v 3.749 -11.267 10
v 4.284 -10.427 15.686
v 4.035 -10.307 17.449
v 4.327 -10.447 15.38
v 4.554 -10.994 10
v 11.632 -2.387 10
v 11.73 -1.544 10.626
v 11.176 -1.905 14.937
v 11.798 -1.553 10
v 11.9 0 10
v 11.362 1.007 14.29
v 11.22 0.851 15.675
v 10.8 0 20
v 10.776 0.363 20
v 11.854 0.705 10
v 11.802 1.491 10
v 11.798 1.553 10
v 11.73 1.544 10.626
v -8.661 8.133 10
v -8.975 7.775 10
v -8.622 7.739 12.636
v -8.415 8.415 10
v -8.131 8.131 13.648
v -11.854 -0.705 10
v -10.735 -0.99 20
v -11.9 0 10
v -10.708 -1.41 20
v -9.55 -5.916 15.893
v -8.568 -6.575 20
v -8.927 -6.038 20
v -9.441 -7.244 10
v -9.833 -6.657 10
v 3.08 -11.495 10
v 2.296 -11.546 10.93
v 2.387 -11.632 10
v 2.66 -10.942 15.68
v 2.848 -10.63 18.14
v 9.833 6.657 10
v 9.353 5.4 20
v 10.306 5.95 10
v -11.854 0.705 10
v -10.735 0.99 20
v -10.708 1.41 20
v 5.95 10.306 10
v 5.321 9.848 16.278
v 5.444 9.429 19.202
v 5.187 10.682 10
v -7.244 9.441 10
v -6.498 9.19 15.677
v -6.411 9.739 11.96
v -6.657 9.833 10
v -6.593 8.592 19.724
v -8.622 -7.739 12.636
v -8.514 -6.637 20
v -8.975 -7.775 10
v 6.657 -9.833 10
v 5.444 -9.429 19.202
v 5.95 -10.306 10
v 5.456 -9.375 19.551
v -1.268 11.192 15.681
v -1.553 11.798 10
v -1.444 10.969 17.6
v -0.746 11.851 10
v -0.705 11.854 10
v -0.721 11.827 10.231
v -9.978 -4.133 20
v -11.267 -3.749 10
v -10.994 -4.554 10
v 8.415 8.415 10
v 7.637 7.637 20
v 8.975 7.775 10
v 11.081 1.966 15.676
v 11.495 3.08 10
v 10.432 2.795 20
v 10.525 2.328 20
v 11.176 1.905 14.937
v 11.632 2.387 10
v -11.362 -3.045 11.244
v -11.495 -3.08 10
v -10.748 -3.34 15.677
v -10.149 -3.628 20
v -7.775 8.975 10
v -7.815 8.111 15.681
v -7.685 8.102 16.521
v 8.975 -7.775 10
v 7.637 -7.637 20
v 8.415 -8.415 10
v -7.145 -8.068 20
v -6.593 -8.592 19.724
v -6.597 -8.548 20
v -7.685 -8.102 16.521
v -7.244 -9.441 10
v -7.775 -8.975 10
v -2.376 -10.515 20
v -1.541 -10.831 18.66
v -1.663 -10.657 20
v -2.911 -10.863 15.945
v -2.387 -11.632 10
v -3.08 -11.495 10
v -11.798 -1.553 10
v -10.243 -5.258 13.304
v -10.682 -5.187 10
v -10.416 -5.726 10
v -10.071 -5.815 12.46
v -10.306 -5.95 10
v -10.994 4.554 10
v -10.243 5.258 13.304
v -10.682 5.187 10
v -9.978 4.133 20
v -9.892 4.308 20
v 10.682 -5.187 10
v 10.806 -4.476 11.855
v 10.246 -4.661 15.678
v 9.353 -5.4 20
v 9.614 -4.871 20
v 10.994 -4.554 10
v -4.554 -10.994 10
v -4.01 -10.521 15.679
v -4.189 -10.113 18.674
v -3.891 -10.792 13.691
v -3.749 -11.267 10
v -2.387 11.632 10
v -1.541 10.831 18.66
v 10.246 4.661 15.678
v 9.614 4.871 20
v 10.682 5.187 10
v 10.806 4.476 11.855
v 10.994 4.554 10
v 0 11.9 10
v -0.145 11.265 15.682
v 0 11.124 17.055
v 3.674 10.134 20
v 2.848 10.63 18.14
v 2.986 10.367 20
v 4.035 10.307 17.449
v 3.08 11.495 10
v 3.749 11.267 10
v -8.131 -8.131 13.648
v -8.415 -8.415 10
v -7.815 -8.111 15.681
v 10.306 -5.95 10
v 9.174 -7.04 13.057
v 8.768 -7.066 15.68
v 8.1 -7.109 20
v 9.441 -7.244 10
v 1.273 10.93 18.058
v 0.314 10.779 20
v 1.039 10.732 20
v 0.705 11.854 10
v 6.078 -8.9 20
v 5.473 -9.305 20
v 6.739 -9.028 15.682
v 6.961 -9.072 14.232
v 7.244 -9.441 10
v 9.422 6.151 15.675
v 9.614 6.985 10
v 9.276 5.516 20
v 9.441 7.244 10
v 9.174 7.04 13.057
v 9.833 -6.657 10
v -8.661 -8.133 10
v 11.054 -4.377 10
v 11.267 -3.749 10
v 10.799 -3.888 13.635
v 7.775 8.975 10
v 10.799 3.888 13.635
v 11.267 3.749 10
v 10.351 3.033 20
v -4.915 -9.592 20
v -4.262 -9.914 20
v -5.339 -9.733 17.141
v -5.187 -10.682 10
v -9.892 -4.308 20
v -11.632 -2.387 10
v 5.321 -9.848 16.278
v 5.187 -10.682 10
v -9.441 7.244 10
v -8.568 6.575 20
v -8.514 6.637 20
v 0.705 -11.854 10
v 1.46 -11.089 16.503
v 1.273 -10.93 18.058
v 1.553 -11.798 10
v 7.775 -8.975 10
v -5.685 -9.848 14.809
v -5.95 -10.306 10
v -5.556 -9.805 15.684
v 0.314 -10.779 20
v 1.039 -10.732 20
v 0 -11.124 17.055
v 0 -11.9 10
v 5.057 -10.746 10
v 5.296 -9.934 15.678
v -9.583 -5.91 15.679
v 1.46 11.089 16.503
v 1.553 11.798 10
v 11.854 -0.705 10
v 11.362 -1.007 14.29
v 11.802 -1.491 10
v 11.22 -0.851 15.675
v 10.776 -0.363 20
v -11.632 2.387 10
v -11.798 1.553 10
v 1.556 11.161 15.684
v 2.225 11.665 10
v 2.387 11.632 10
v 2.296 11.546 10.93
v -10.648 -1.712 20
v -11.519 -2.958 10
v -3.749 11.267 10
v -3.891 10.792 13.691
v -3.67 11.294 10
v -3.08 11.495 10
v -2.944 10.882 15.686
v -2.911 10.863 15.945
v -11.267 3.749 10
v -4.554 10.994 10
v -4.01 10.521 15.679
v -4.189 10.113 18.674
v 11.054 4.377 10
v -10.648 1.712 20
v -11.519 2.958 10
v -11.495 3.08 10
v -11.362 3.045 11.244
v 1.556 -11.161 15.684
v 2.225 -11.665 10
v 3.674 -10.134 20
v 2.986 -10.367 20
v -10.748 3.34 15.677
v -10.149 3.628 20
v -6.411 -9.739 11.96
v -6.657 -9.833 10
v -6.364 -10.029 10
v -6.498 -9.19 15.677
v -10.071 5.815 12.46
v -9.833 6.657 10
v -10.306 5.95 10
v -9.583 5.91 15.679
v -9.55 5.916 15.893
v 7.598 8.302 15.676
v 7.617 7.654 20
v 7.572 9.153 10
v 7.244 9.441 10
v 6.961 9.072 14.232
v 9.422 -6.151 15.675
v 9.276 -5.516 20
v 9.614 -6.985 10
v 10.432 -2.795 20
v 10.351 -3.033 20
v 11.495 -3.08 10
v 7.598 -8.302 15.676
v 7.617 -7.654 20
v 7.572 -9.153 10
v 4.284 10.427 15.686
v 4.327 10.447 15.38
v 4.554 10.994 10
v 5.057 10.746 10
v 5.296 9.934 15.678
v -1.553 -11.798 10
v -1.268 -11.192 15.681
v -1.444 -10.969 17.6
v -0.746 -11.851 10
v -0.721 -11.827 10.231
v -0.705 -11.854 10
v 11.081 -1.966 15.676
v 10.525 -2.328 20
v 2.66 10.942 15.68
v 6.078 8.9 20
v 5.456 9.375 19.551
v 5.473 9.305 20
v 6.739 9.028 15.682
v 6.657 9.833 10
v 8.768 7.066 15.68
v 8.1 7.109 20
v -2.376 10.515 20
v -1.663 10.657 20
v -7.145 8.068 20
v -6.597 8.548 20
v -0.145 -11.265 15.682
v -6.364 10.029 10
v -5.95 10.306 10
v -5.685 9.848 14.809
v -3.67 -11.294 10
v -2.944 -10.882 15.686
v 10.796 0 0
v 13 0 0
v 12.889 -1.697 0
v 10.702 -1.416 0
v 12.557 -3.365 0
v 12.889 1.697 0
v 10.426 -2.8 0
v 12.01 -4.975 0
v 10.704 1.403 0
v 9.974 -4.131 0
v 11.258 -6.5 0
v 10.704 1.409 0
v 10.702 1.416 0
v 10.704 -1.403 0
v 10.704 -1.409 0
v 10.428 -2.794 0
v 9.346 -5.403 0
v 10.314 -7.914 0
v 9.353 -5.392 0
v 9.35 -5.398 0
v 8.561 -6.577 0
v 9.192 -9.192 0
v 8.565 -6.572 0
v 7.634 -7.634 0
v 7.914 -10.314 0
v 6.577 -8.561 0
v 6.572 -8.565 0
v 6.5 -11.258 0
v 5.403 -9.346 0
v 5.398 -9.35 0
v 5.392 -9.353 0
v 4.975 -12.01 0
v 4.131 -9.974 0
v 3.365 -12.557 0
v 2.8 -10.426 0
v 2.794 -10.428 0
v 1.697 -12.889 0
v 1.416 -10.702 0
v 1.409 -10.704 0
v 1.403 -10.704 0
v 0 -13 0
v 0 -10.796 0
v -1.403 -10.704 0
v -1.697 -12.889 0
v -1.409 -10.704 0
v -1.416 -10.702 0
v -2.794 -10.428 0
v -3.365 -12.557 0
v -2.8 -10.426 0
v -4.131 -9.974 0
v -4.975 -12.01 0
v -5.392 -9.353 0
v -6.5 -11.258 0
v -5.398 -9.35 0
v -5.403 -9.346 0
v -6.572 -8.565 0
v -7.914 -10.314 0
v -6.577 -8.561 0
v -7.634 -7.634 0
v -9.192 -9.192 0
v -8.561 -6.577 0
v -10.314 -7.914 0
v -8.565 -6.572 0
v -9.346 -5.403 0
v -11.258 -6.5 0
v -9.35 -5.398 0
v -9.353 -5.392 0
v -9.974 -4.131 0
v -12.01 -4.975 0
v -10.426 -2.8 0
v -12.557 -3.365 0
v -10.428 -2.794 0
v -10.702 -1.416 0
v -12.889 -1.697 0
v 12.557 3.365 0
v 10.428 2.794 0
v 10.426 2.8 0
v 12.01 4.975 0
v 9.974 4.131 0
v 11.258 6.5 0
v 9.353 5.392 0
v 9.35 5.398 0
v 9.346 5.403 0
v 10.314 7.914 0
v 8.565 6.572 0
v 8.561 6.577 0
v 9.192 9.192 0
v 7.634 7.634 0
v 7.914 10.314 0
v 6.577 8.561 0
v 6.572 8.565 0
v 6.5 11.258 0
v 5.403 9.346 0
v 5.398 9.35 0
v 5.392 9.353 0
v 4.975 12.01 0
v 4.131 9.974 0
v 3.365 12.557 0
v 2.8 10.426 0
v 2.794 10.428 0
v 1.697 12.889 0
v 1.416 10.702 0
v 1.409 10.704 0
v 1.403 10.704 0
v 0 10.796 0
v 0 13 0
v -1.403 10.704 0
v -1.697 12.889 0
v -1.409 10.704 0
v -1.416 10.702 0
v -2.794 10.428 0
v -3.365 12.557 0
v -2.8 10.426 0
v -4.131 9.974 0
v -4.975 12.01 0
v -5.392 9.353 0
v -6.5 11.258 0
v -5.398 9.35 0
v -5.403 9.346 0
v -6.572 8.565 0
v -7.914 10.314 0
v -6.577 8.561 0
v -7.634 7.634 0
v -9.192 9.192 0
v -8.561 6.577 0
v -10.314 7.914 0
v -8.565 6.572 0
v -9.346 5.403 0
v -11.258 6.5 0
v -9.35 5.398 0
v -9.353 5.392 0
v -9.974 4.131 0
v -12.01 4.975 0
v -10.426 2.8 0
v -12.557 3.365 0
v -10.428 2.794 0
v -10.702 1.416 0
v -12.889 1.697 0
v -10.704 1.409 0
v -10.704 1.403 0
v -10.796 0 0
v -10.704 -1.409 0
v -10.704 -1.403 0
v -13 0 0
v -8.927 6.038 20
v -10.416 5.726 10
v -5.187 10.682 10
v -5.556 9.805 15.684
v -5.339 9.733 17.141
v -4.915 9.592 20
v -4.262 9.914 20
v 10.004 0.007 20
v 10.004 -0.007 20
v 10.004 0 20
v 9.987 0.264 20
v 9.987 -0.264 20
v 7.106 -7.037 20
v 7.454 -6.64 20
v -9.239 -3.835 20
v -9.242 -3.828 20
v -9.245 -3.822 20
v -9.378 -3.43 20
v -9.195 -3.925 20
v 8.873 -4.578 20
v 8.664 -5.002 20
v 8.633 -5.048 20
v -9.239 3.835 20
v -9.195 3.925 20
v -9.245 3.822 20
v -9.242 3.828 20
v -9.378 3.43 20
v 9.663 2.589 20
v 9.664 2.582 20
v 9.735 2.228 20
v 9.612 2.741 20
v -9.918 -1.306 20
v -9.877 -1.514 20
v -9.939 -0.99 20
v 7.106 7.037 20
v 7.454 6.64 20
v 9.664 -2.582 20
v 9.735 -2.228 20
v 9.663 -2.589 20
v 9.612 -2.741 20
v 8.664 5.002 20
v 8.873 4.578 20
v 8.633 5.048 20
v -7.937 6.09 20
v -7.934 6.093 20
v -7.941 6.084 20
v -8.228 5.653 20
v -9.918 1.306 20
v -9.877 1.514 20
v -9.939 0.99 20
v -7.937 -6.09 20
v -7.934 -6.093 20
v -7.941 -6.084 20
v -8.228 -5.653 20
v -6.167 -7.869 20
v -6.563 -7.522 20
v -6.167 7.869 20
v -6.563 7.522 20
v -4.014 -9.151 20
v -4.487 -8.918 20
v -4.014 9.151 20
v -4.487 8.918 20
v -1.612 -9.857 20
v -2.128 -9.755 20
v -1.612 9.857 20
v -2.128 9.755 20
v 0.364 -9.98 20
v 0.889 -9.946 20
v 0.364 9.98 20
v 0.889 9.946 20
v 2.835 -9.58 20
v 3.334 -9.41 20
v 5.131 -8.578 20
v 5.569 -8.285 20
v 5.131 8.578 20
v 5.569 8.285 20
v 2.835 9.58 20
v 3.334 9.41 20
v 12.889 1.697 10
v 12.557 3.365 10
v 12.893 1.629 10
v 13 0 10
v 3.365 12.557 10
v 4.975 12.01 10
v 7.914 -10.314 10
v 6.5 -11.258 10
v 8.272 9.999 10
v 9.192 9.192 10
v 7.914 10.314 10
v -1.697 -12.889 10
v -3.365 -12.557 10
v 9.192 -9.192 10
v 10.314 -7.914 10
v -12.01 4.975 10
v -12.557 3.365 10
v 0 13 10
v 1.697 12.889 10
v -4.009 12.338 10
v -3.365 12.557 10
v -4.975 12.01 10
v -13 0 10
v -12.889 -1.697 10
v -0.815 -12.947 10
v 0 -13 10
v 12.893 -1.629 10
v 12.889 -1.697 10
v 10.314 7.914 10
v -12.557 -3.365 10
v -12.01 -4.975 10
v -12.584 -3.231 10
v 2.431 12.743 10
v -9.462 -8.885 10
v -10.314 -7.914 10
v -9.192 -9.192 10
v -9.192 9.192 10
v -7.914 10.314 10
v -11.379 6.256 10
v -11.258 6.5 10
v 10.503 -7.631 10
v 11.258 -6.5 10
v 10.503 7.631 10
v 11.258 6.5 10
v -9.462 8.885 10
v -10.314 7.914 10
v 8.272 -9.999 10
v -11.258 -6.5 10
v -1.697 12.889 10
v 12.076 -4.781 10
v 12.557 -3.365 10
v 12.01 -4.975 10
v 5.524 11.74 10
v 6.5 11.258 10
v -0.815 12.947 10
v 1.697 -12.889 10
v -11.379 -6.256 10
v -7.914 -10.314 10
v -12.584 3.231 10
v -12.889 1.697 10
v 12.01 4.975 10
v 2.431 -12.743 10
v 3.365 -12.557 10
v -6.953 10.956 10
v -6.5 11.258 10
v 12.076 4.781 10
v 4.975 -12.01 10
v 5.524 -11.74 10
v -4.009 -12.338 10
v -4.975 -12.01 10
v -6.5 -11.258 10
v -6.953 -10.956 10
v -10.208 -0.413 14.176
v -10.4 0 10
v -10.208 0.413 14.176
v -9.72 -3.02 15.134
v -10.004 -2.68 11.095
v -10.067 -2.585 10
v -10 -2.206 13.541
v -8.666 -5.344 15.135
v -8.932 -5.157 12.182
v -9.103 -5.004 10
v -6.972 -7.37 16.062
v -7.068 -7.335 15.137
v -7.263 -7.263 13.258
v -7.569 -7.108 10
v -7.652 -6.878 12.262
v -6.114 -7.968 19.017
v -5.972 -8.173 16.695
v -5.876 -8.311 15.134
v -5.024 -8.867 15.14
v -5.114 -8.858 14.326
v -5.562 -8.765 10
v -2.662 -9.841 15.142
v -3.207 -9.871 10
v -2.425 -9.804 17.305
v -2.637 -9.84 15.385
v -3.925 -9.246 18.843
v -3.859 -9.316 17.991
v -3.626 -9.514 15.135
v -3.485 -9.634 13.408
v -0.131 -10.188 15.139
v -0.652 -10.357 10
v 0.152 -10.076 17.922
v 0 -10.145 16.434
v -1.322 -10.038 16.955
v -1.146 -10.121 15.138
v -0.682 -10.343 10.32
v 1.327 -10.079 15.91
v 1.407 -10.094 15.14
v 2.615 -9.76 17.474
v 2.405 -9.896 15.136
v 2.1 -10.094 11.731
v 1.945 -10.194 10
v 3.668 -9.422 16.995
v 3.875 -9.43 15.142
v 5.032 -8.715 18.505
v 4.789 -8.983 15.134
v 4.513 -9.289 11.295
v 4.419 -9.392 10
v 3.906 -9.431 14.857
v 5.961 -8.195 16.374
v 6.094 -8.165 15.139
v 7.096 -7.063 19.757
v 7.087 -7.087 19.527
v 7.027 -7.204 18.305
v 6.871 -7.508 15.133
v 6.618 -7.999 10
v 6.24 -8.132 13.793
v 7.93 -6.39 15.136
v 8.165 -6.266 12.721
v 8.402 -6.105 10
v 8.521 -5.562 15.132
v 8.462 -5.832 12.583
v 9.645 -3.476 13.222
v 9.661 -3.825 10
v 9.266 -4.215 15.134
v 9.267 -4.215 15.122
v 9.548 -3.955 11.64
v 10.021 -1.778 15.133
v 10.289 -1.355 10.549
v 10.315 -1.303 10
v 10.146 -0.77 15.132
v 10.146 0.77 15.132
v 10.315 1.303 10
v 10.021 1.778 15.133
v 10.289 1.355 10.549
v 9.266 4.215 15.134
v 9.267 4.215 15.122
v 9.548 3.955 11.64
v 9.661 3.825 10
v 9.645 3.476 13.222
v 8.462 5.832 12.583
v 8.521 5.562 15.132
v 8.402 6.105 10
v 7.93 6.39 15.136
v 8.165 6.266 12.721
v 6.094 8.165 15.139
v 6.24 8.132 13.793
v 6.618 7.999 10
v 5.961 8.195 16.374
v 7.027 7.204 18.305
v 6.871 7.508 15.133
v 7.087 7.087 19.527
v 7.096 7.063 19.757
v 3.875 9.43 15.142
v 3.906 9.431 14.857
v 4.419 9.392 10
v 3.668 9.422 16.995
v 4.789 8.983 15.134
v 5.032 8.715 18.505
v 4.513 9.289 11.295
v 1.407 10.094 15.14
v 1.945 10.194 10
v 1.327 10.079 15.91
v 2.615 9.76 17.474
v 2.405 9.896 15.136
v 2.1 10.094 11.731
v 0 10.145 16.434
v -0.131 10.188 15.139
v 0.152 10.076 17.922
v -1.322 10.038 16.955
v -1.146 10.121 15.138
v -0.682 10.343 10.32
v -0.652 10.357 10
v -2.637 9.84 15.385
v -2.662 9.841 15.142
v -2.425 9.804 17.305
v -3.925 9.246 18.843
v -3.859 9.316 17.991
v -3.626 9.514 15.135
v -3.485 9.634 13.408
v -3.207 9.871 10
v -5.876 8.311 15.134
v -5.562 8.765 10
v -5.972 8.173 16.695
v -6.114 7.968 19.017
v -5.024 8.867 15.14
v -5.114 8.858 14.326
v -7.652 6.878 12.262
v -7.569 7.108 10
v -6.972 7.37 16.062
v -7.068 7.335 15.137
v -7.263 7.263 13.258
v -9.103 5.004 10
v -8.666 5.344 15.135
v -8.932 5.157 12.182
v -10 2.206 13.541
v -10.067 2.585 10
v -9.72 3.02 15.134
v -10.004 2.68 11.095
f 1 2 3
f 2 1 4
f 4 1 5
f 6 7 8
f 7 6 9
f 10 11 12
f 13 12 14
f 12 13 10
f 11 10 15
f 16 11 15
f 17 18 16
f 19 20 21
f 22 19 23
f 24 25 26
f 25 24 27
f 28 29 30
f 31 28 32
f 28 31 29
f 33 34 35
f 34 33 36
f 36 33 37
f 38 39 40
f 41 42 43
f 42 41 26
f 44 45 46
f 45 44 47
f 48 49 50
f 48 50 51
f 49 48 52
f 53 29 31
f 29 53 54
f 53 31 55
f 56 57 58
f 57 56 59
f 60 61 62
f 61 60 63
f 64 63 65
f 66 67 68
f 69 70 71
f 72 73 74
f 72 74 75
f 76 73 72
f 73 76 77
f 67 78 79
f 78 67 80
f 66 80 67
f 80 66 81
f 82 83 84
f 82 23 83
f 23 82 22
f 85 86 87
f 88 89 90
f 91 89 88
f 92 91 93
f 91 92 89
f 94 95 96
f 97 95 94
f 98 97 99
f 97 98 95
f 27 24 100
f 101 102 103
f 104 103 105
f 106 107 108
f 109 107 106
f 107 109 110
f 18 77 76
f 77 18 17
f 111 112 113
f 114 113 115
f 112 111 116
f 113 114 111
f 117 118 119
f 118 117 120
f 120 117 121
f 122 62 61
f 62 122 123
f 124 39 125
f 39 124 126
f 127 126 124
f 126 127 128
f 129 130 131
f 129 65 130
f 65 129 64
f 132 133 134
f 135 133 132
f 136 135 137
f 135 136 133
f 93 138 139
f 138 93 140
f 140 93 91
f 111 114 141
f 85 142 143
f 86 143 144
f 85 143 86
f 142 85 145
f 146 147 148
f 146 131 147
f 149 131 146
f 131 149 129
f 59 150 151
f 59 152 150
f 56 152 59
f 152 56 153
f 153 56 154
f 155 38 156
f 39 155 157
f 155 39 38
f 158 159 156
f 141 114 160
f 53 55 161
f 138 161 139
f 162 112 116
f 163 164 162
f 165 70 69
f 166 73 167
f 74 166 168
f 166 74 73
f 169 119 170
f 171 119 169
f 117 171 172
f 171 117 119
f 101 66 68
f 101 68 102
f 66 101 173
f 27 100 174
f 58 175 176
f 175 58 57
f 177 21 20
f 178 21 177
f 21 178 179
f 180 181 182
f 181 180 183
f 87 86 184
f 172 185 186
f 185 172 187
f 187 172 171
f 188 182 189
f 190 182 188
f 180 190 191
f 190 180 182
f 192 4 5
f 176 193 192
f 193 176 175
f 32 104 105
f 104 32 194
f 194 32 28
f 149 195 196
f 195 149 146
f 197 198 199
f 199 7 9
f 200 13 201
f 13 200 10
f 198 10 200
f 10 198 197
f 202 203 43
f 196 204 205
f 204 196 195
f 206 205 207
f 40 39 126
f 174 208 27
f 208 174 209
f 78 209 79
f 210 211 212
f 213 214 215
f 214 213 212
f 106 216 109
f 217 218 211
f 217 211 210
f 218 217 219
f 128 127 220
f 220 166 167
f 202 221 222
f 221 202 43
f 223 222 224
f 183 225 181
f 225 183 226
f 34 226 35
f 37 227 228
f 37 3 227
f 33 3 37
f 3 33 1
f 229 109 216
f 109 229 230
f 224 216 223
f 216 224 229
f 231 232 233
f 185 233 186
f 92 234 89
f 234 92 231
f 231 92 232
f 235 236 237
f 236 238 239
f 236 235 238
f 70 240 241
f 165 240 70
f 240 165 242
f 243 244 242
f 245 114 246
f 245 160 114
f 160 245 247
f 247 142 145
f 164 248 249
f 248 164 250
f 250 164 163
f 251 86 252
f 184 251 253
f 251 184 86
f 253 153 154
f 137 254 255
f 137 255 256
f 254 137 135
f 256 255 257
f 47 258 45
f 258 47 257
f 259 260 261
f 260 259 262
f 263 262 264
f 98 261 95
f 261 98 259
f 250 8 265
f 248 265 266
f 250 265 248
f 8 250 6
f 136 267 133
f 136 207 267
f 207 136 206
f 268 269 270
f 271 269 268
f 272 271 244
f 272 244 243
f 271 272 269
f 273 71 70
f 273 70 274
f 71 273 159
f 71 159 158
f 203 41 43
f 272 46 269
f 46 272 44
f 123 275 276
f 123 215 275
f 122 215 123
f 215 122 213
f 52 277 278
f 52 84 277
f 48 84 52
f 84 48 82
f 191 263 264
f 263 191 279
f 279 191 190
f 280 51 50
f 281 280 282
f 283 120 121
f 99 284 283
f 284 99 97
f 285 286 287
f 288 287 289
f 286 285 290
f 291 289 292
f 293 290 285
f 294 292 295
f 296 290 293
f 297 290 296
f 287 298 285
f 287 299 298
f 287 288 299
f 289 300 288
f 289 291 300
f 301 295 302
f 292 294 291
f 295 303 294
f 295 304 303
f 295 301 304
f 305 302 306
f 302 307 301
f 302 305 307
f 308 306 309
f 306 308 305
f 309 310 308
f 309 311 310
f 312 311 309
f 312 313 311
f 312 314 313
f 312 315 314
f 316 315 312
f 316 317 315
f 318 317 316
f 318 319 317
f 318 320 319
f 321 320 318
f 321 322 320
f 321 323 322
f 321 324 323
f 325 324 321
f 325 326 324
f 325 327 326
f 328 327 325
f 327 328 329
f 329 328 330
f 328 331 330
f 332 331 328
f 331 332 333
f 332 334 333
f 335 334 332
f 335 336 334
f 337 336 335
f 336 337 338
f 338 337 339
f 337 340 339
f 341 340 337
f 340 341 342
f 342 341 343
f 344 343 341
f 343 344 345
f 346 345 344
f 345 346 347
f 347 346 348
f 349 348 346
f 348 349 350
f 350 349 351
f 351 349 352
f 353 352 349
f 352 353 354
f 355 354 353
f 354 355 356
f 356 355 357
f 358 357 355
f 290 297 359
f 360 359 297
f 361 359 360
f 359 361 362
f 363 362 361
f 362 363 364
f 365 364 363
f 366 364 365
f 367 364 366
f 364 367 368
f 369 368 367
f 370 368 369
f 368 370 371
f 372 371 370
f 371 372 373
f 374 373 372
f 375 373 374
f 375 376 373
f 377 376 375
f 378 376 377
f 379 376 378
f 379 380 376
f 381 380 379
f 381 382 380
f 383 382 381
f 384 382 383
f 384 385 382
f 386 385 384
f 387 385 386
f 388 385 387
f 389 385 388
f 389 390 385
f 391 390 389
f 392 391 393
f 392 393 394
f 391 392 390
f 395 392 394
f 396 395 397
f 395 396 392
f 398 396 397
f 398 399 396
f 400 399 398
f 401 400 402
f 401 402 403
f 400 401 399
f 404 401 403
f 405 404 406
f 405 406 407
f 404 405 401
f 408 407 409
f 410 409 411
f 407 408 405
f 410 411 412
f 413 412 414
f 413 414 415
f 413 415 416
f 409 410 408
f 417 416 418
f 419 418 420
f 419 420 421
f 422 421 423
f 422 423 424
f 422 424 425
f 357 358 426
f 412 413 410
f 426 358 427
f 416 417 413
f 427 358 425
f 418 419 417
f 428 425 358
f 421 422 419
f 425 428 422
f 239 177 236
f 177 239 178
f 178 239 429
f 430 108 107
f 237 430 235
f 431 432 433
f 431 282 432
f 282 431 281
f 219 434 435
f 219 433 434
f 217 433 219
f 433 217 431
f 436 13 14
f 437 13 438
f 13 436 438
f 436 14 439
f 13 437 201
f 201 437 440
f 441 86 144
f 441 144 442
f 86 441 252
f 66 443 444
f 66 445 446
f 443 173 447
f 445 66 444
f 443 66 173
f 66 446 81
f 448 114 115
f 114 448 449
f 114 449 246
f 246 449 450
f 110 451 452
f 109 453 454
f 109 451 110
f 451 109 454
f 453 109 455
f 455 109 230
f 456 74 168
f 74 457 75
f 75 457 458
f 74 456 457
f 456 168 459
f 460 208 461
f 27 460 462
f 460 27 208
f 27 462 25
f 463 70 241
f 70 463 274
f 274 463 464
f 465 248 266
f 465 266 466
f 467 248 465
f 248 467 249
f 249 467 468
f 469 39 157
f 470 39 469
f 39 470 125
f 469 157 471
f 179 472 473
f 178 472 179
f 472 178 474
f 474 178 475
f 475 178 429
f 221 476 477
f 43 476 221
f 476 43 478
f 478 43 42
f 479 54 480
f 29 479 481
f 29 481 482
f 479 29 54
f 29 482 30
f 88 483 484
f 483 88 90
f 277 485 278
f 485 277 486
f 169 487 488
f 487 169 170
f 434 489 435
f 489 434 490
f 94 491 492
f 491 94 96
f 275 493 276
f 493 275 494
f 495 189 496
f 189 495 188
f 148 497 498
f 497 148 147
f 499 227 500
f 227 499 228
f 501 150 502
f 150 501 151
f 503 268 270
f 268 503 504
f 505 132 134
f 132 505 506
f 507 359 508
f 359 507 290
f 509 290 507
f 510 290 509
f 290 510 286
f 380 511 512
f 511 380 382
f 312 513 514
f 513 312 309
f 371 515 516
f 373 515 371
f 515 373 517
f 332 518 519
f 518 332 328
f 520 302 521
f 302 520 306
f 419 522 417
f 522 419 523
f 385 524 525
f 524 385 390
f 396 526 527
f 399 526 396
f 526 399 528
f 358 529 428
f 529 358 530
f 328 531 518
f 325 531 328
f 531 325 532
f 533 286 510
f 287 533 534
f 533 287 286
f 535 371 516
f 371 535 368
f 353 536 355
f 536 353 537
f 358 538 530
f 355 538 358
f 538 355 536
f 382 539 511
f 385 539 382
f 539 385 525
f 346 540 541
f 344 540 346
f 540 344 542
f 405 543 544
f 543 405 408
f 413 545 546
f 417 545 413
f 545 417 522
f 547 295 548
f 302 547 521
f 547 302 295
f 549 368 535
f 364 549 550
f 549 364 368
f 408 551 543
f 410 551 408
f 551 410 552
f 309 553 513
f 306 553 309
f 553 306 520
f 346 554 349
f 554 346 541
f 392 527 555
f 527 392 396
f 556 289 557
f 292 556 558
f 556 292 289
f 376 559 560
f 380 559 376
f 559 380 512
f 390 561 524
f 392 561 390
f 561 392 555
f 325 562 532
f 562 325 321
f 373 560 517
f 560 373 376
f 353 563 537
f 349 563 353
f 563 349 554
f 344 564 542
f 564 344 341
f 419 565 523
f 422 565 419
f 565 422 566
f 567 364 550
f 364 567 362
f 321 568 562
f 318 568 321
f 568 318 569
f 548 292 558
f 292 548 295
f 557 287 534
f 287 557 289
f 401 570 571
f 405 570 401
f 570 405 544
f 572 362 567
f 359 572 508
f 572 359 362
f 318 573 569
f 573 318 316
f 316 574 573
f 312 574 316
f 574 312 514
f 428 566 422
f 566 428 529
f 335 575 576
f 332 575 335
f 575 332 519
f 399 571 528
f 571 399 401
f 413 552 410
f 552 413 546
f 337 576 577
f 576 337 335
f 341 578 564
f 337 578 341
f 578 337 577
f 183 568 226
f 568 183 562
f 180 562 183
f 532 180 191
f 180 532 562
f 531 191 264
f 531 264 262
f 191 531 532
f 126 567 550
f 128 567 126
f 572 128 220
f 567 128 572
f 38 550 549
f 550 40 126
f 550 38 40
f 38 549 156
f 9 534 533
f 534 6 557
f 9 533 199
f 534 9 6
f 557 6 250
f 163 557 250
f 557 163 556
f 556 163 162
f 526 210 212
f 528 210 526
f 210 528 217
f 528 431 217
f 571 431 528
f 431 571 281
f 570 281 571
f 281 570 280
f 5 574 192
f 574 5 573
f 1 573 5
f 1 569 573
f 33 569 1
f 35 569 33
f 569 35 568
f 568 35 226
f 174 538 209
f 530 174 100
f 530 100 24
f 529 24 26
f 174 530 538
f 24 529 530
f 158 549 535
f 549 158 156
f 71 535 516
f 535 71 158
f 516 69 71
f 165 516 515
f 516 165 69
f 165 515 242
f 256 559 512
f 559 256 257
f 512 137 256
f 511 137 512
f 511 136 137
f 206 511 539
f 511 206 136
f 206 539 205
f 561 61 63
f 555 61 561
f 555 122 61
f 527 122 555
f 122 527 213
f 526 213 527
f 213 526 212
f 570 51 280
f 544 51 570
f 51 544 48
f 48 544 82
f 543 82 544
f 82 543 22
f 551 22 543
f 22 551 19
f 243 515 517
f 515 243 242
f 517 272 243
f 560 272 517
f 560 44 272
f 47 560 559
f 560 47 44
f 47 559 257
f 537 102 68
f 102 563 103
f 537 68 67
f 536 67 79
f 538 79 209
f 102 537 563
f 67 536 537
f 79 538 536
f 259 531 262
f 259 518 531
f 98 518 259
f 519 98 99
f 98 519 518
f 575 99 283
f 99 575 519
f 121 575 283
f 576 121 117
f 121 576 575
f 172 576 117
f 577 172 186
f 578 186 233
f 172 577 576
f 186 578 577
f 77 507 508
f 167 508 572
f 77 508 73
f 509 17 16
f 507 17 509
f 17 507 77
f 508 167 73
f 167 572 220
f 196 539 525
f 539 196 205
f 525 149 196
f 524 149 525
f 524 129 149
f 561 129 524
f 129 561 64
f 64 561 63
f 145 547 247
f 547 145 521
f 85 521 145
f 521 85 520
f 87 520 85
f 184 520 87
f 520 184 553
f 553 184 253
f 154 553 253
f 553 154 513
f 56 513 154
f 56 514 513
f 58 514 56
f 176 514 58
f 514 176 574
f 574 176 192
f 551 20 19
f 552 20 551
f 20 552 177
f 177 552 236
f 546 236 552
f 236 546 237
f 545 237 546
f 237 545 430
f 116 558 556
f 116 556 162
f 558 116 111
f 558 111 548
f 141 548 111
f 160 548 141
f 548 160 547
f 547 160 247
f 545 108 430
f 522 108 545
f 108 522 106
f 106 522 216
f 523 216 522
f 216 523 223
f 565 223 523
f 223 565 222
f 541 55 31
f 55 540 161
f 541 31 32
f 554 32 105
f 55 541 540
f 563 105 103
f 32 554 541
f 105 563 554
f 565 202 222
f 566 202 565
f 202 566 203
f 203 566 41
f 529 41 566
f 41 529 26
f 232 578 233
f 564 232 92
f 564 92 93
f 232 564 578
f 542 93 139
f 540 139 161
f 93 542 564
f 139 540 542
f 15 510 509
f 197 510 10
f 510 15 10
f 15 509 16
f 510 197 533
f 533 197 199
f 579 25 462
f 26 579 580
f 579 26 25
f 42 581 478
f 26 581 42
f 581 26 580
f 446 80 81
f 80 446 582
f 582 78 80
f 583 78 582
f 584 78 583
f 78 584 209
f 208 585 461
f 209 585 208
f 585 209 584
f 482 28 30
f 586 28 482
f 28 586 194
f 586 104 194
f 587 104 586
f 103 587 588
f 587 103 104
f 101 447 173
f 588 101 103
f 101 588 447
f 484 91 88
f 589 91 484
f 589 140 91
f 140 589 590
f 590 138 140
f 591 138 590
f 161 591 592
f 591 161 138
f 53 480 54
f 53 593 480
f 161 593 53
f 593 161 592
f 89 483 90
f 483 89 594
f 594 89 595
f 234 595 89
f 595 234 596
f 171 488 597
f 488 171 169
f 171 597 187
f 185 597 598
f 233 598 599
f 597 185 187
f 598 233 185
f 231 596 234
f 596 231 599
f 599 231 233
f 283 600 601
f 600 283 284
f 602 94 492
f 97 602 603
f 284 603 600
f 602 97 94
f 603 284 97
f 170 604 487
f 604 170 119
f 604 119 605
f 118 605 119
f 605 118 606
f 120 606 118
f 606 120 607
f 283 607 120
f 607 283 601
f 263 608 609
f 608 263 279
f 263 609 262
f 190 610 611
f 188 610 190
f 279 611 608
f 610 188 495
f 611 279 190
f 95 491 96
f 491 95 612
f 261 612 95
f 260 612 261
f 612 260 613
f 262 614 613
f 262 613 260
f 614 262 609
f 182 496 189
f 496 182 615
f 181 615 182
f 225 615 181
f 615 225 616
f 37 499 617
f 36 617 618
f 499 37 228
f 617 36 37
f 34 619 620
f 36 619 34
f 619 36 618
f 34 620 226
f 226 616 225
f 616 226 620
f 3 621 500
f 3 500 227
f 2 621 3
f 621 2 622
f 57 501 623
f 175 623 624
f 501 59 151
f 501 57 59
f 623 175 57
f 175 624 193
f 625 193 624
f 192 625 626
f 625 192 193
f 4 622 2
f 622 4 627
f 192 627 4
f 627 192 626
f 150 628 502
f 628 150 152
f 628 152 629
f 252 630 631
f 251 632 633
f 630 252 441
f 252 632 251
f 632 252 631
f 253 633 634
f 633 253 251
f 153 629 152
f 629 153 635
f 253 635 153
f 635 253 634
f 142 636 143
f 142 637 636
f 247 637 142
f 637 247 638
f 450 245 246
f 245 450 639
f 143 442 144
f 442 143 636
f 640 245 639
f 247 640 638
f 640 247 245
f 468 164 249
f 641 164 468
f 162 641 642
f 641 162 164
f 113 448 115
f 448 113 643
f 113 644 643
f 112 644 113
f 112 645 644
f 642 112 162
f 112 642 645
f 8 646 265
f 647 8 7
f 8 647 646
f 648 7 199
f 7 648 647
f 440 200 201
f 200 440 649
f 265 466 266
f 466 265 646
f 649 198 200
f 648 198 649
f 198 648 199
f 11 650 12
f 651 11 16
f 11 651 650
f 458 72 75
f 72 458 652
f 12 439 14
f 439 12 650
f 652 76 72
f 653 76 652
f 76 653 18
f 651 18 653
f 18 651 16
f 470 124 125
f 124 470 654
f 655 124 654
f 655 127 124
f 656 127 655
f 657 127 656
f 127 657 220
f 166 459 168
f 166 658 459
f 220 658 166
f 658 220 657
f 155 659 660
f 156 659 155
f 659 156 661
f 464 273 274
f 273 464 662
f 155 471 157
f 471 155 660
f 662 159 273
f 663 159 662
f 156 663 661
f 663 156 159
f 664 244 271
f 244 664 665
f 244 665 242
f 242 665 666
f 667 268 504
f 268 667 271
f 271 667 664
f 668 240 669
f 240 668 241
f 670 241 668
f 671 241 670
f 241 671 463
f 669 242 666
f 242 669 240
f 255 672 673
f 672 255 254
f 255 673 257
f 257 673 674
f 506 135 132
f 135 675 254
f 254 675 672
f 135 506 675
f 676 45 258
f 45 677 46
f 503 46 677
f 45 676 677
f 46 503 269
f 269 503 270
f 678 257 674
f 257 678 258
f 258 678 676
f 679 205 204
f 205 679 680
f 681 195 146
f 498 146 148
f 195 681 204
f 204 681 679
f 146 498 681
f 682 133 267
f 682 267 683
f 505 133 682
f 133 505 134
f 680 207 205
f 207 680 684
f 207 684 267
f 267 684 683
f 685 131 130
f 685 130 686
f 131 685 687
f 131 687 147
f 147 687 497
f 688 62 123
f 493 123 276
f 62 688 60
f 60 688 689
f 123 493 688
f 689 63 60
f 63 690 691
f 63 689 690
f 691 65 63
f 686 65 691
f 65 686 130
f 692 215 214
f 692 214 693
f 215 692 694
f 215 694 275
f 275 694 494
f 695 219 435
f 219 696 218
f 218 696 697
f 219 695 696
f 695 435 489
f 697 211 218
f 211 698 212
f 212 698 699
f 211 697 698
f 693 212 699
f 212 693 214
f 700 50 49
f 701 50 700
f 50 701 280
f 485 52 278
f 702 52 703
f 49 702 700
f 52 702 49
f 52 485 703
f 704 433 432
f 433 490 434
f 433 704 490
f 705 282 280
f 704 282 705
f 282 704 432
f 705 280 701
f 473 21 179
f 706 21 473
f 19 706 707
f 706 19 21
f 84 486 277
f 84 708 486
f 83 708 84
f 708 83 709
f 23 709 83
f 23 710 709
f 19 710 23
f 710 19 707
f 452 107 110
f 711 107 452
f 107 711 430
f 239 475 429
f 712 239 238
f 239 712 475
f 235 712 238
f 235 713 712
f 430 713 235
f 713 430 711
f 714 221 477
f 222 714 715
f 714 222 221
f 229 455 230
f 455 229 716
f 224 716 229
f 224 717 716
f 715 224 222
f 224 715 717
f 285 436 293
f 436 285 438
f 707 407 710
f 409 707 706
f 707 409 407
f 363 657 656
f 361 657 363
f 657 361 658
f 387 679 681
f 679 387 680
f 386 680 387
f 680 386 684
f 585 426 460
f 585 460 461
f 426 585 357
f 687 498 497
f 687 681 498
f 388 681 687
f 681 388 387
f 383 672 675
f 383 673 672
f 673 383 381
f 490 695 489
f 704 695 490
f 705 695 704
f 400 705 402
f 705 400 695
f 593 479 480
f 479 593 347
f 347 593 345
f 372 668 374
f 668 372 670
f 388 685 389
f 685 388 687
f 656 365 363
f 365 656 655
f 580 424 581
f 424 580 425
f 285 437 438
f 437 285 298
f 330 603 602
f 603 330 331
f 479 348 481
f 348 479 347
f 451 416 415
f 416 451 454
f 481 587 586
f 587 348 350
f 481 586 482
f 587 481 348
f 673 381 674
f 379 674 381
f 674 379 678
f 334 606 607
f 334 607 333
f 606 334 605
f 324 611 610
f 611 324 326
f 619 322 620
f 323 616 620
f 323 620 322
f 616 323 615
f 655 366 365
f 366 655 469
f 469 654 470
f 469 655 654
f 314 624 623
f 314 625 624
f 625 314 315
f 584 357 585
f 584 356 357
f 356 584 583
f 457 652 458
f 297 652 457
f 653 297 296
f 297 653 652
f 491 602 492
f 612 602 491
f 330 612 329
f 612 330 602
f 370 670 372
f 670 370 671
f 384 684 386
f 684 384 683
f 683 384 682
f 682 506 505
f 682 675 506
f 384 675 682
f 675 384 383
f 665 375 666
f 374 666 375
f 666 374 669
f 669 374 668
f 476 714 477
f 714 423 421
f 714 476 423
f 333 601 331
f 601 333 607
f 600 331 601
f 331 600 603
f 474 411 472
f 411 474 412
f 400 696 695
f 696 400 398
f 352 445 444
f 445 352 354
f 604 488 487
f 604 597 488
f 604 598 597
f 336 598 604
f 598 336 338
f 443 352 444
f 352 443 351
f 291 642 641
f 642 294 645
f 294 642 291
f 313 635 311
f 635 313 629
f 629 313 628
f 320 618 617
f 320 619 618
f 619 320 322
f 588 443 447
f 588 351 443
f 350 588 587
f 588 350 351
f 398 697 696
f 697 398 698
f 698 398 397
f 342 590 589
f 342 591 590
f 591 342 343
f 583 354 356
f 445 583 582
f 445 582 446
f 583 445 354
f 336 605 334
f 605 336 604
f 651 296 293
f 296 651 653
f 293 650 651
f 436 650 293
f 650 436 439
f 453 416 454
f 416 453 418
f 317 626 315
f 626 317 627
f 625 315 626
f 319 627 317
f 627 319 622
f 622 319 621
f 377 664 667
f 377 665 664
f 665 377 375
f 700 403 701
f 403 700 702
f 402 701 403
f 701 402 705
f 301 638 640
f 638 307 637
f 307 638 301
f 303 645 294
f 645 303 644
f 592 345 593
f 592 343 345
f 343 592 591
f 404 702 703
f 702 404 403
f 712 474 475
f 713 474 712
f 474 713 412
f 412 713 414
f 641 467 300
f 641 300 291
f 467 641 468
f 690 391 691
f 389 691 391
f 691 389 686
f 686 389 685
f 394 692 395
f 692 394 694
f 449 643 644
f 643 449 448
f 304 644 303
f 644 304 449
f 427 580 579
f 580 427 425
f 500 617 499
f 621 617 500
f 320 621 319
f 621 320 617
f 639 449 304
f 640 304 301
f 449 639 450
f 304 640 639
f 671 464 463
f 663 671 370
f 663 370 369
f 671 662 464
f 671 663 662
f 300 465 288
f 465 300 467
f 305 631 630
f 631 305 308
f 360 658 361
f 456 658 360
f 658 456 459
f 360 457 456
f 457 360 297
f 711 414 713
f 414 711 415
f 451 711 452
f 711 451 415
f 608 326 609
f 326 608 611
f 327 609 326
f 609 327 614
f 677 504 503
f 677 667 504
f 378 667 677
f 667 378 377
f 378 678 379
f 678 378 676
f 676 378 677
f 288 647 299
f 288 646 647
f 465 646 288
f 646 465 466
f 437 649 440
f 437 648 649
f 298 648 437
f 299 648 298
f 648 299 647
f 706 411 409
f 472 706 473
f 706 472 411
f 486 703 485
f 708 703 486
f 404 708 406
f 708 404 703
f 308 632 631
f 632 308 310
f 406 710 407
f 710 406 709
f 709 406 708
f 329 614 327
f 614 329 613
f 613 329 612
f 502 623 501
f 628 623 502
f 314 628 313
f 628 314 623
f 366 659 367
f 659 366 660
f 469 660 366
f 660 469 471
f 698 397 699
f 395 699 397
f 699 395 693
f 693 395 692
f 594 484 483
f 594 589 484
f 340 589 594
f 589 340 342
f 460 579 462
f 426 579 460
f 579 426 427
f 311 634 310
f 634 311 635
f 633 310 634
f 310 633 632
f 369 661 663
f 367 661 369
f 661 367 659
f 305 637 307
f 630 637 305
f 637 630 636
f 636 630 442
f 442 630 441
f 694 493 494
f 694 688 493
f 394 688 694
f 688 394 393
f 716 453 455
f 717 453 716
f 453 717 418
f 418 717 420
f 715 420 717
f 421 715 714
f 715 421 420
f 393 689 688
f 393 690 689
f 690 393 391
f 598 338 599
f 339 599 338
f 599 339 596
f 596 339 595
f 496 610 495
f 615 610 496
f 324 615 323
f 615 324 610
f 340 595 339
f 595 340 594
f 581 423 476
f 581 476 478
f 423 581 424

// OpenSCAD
brush_diameter = 20; //mm
comb_height = 20; //mm
side_thickness = 3; // mm
tooth_thickness = 0.8;

$fn=48;

difference() {
  union() {
    // whole comb
    cylinder(
      d1=brush_diameter + 2 * side_thickness,
      d2=brush_diameter + 2 * tooth_thickness,
      h=comb_height
    );
    // handle of comb
    cylinder(d=brush_diameter + 2 * side_thickness, h=comb_height / 2);
  }

  // cut out middle
  translate([0, 0, -0.1]) {
    cylinder(
      d1=brush_diameter + 2 * tooth_thickness,
      d2=brush_diameter,
      h=comb_height + 0.2
    );
  }

  // cut out teeth
  translate([0, 0, comb_height / 2]) {
    for(a=[0:teeth_angle(brush_diameter):360]) {
      rotate([0, -90, a]) {
        linear_extrude(brush_diameter) {
          polygon([[0,0], [comb_height / 2 + 0.1, 1], [comb_height / 2 + 0.1, -1]]);
        }
      }
    }
  }
}

function teeth_angle(diameter) = 360 / (floor(360 / (280 / diameter)));
